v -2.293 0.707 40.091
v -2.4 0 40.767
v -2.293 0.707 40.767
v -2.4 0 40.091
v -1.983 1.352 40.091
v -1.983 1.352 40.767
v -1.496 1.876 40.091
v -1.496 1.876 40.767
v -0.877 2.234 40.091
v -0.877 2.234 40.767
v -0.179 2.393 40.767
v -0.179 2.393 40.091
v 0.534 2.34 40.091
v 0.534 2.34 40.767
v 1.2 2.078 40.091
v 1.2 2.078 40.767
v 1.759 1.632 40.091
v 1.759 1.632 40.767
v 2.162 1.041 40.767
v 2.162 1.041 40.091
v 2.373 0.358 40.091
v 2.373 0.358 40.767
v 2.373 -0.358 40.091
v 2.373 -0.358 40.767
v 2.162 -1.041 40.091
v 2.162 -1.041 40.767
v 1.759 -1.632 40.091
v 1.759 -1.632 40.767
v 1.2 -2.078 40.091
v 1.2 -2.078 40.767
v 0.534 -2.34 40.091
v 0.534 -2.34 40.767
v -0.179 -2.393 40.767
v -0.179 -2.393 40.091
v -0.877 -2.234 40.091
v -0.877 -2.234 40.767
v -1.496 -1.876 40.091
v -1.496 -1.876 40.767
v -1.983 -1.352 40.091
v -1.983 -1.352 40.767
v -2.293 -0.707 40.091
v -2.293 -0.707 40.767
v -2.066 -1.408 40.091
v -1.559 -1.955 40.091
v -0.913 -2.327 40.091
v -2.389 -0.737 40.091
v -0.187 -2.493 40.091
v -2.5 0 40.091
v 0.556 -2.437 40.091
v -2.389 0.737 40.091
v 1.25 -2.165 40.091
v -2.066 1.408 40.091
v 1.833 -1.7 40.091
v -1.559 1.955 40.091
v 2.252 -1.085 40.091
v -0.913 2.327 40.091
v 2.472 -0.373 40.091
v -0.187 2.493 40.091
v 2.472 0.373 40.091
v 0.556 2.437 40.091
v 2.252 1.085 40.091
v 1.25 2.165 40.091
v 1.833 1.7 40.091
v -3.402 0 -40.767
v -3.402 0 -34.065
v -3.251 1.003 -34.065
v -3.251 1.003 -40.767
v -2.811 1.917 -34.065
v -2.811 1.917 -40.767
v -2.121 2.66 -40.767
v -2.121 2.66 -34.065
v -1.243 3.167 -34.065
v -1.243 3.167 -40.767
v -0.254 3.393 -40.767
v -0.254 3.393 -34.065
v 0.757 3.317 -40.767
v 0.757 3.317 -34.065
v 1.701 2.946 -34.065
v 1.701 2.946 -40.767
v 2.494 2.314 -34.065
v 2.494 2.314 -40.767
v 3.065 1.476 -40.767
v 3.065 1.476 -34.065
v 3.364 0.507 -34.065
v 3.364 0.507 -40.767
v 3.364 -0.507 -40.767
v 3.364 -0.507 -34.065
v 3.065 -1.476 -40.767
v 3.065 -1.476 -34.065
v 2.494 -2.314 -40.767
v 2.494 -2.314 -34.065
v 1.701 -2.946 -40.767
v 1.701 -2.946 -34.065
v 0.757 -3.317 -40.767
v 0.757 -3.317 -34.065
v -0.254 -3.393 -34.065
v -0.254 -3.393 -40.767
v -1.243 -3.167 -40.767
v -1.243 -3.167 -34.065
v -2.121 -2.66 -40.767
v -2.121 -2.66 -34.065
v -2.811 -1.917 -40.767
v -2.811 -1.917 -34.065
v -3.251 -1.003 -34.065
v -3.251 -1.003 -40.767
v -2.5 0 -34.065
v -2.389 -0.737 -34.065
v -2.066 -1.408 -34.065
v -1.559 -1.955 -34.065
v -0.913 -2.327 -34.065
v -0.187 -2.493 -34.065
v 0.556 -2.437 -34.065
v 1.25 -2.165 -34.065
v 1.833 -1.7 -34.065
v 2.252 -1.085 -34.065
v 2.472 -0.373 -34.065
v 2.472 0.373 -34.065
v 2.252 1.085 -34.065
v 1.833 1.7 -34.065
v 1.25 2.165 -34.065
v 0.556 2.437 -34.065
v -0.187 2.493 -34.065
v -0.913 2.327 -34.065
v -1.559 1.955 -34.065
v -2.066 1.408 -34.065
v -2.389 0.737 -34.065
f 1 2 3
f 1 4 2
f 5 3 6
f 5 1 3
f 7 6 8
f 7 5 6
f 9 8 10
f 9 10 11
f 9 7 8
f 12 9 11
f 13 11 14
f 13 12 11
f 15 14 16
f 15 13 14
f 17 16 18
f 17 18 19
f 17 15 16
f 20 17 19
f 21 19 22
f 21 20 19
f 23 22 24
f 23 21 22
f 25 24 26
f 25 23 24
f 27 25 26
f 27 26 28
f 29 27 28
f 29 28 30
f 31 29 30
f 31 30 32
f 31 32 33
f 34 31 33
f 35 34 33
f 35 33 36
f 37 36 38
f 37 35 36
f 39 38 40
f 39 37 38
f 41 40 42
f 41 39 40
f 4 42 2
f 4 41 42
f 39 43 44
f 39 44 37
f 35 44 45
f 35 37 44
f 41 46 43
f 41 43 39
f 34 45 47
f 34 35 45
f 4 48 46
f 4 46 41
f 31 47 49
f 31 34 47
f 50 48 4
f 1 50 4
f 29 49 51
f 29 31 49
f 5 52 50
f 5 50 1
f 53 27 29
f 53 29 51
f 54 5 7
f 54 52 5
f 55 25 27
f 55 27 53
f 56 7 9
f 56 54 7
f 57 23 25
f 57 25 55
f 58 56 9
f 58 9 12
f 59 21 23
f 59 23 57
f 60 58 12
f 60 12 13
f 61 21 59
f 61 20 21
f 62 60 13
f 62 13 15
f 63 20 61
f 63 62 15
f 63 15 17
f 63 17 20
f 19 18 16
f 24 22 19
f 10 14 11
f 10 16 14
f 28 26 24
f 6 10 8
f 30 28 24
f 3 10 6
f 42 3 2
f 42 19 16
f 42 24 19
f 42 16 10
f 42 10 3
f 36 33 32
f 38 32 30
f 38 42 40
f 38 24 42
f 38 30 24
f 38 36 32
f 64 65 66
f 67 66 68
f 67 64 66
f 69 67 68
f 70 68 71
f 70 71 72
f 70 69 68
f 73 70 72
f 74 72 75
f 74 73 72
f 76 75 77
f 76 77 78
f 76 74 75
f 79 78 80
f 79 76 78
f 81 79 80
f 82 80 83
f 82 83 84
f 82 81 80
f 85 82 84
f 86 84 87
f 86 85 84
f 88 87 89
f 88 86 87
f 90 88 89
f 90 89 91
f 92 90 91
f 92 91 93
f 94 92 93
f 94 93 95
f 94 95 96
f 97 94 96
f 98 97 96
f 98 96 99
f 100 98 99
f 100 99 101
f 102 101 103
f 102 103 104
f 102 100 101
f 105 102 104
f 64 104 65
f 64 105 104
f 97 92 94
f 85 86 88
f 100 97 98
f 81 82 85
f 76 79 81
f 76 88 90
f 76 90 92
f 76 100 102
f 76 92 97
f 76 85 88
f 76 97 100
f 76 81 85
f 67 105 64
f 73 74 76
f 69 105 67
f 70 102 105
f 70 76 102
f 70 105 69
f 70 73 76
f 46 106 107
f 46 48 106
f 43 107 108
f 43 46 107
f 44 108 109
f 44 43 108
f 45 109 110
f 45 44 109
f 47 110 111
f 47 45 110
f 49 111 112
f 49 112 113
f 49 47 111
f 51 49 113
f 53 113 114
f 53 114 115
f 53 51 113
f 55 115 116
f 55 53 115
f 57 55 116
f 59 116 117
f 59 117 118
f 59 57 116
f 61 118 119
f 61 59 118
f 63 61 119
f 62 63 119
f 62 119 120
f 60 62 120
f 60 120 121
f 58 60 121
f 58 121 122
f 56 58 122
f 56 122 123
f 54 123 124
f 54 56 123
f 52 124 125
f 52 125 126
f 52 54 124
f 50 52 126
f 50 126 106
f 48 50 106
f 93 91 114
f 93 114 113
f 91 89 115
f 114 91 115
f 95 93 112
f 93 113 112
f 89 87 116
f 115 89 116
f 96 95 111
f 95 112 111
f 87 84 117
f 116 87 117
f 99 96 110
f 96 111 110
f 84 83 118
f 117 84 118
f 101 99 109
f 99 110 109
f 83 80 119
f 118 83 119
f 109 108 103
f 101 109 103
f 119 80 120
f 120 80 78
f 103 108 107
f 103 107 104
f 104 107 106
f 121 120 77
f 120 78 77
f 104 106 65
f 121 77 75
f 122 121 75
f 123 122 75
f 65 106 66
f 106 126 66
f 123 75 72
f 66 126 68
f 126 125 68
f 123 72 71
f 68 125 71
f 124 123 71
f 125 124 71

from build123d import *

# Parameters (mm, degrees)
SKETCH1_R           = 2.5
BOSS_EXTRUDE1_DEPTH = 40.767
SKETCH2_W           = 0.7
SKETCH2_H           = 0.1
SKETCH4_R           = 3.402225697
BOSS_EXTRUDE2_DEPTH = 6.701877401


with BuildPart() as part:
    # Sketch1 → Boss-Extrude1 (new, symmetric)
    with BuildSketch(Plane.XY):
        with Locations(Location((0, 0, 0), (0, 0, 180))):
            Circle(SKETCH1_R)
    extrude(amount=BOSS_EXTRUDE1_DEPTH, both=True)

    # Sketch2 → Cut-Revolve1 (revolve, cut)
    with BuildSketch(Plane(origin=(0, 0, 0), x_dir=(0, 0, -1), z_dir=(1, 0, 0)), mode=Mode.PRIVATE) as cut_revolve1_sk:
        with Locations((-40.441143952, 2.45)):
            Rectangle(SKETCH2_W, SKETCH2_H)
    revolve(cut_revolve1_sk.sketch.rotate(Axis((0, 0, 40.767), (0, 0, -1)), 270), axis=Axis((0, 0, 40.767), (0, 0, -1)), mode=Mode.SUBTRACT)

    # Sketch4 → Boss-Extrude2 (add)
    with BuildSketch(Plane(origin=(0, 0, -40.767), x_dir=(-1, 0, 0), z_dir=(0, 0, -1))):
        Circle(SKETCH4_R)
    extrude(amount=-BOSS_EXTRUDE2_DEPTH)


solid = part.part
